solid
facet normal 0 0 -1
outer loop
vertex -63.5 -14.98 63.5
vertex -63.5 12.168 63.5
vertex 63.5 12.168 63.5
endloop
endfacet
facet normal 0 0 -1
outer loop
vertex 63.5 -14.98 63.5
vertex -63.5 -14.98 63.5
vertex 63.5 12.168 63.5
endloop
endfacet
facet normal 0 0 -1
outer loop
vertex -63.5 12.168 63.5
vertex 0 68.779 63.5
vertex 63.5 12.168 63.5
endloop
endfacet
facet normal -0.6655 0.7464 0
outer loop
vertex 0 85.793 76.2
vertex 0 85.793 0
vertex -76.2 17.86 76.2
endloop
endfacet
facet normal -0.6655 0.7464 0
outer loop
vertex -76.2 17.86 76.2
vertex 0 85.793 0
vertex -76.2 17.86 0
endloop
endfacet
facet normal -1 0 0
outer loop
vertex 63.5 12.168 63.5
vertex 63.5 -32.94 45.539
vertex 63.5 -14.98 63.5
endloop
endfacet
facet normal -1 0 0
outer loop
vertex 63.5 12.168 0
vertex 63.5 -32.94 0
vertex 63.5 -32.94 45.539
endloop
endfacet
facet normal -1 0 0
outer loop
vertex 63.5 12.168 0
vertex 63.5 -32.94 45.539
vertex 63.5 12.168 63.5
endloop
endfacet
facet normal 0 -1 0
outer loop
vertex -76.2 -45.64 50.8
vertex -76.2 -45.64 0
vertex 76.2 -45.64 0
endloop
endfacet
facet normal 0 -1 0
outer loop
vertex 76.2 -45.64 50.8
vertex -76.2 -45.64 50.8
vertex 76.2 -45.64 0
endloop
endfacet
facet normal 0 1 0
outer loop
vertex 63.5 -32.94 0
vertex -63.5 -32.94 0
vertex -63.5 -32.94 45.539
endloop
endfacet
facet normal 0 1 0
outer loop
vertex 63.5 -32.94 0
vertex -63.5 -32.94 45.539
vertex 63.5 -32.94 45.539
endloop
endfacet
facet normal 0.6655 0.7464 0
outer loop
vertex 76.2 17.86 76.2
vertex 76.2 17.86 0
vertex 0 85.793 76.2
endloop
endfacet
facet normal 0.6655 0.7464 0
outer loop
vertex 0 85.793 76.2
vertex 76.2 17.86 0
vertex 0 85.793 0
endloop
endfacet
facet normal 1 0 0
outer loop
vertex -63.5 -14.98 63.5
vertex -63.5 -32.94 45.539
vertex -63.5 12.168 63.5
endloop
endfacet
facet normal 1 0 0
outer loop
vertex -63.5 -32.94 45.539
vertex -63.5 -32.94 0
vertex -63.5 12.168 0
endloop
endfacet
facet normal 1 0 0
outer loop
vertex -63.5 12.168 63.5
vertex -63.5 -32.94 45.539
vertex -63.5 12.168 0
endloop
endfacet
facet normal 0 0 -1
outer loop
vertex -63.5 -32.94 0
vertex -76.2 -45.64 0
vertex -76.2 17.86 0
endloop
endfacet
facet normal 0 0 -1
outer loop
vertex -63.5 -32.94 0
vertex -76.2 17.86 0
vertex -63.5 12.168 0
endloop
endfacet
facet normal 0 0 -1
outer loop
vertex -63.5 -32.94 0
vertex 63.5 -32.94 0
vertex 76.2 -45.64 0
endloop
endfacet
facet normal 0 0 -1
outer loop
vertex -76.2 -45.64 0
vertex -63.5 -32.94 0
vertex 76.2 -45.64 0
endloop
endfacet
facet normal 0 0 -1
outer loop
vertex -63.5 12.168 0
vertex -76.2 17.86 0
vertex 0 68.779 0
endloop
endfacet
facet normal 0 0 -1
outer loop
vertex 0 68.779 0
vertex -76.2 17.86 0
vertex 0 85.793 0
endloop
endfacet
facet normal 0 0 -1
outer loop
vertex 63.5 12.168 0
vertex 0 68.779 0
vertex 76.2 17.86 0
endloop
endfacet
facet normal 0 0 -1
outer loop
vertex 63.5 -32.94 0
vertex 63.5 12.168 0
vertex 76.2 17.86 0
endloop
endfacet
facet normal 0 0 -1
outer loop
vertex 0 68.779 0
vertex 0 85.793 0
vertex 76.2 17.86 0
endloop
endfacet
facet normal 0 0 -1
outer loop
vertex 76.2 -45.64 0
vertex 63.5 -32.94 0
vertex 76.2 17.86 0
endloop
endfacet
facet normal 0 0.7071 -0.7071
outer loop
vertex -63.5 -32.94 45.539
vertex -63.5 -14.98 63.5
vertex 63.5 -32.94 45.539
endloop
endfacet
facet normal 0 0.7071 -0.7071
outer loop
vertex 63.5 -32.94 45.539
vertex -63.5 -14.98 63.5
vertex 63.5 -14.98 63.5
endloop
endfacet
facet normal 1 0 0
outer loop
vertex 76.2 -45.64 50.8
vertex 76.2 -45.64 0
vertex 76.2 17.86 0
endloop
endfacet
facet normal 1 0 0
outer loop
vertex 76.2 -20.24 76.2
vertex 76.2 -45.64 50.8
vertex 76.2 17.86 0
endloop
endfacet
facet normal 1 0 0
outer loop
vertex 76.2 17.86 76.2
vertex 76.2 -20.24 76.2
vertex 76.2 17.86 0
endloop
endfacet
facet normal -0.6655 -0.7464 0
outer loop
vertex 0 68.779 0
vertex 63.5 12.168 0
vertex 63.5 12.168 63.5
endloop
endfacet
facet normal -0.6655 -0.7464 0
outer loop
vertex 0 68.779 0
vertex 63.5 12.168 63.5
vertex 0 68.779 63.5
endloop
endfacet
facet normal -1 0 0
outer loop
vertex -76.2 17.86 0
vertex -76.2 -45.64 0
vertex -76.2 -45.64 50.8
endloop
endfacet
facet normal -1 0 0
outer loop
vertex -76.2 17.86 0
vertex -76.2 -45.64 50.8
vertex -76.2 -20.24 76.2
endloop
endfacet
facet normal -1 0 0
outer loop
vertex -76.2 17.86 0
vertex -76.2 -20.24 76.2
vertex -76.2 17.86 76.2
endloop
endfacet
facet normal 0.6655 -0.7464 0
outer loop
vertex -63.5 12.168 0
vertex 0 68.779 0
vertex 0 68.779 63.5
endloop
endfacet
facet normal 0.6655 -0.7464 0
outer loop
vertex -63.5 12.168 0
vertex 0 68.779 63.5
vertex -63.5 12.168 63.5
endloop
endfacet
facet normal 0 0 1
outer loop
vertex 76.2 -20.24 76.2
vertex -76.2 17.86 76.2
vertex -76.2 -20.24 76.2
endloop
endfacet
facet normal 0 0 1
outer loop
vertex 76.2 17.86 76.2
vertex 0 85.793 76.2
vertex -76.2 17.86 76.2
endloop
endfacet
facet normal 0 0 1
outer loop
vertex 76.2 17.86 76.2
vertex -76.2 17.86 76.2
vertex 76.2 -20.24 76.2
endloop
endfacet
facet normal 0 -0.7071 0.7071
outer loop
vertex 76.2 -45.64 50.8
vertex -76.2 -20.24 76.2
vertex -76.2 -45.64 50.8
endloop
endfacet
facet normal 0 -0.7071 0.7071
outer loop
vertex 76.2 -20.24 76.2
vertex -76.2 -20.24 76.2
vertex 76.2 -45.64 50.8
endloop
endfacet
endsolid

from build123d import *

# Parameters (mm, degrees)
F0_W     = 152.4
F0_H     = 63.5
F1_DEPTH = 76.2
F2_SIZE  = 25.4
F3_T     = -12.7


with BuildPart() as f1:
    # F0 (on Top) → F1 (new body)
    with BuildSketch(Plane.XY):
        with Locations((0, -13.890435)):
            Rectangle(F0_W, F0_H)
        Polygon((0, 85.793309), (-76.2, 17.859565), (76.2, 17.859565), align=None)
    extrude(amount=F1_DEPTH)

    # F2
    f2_edges = [f1.edges().sort_by_distance(p)[0] for p in [
        (0, -45.640435, 76.2),
    ]]
    chamfer(f2_edges, length=F2_SIZE)

    # F3
    f3_openings = [f1.faces().sort_by_distance(p)[0] for p in [
        (0, 5.065891, 0),
    ]]
    offset(amount=F3_T, openings=f3_openings)


solid = f1.part
